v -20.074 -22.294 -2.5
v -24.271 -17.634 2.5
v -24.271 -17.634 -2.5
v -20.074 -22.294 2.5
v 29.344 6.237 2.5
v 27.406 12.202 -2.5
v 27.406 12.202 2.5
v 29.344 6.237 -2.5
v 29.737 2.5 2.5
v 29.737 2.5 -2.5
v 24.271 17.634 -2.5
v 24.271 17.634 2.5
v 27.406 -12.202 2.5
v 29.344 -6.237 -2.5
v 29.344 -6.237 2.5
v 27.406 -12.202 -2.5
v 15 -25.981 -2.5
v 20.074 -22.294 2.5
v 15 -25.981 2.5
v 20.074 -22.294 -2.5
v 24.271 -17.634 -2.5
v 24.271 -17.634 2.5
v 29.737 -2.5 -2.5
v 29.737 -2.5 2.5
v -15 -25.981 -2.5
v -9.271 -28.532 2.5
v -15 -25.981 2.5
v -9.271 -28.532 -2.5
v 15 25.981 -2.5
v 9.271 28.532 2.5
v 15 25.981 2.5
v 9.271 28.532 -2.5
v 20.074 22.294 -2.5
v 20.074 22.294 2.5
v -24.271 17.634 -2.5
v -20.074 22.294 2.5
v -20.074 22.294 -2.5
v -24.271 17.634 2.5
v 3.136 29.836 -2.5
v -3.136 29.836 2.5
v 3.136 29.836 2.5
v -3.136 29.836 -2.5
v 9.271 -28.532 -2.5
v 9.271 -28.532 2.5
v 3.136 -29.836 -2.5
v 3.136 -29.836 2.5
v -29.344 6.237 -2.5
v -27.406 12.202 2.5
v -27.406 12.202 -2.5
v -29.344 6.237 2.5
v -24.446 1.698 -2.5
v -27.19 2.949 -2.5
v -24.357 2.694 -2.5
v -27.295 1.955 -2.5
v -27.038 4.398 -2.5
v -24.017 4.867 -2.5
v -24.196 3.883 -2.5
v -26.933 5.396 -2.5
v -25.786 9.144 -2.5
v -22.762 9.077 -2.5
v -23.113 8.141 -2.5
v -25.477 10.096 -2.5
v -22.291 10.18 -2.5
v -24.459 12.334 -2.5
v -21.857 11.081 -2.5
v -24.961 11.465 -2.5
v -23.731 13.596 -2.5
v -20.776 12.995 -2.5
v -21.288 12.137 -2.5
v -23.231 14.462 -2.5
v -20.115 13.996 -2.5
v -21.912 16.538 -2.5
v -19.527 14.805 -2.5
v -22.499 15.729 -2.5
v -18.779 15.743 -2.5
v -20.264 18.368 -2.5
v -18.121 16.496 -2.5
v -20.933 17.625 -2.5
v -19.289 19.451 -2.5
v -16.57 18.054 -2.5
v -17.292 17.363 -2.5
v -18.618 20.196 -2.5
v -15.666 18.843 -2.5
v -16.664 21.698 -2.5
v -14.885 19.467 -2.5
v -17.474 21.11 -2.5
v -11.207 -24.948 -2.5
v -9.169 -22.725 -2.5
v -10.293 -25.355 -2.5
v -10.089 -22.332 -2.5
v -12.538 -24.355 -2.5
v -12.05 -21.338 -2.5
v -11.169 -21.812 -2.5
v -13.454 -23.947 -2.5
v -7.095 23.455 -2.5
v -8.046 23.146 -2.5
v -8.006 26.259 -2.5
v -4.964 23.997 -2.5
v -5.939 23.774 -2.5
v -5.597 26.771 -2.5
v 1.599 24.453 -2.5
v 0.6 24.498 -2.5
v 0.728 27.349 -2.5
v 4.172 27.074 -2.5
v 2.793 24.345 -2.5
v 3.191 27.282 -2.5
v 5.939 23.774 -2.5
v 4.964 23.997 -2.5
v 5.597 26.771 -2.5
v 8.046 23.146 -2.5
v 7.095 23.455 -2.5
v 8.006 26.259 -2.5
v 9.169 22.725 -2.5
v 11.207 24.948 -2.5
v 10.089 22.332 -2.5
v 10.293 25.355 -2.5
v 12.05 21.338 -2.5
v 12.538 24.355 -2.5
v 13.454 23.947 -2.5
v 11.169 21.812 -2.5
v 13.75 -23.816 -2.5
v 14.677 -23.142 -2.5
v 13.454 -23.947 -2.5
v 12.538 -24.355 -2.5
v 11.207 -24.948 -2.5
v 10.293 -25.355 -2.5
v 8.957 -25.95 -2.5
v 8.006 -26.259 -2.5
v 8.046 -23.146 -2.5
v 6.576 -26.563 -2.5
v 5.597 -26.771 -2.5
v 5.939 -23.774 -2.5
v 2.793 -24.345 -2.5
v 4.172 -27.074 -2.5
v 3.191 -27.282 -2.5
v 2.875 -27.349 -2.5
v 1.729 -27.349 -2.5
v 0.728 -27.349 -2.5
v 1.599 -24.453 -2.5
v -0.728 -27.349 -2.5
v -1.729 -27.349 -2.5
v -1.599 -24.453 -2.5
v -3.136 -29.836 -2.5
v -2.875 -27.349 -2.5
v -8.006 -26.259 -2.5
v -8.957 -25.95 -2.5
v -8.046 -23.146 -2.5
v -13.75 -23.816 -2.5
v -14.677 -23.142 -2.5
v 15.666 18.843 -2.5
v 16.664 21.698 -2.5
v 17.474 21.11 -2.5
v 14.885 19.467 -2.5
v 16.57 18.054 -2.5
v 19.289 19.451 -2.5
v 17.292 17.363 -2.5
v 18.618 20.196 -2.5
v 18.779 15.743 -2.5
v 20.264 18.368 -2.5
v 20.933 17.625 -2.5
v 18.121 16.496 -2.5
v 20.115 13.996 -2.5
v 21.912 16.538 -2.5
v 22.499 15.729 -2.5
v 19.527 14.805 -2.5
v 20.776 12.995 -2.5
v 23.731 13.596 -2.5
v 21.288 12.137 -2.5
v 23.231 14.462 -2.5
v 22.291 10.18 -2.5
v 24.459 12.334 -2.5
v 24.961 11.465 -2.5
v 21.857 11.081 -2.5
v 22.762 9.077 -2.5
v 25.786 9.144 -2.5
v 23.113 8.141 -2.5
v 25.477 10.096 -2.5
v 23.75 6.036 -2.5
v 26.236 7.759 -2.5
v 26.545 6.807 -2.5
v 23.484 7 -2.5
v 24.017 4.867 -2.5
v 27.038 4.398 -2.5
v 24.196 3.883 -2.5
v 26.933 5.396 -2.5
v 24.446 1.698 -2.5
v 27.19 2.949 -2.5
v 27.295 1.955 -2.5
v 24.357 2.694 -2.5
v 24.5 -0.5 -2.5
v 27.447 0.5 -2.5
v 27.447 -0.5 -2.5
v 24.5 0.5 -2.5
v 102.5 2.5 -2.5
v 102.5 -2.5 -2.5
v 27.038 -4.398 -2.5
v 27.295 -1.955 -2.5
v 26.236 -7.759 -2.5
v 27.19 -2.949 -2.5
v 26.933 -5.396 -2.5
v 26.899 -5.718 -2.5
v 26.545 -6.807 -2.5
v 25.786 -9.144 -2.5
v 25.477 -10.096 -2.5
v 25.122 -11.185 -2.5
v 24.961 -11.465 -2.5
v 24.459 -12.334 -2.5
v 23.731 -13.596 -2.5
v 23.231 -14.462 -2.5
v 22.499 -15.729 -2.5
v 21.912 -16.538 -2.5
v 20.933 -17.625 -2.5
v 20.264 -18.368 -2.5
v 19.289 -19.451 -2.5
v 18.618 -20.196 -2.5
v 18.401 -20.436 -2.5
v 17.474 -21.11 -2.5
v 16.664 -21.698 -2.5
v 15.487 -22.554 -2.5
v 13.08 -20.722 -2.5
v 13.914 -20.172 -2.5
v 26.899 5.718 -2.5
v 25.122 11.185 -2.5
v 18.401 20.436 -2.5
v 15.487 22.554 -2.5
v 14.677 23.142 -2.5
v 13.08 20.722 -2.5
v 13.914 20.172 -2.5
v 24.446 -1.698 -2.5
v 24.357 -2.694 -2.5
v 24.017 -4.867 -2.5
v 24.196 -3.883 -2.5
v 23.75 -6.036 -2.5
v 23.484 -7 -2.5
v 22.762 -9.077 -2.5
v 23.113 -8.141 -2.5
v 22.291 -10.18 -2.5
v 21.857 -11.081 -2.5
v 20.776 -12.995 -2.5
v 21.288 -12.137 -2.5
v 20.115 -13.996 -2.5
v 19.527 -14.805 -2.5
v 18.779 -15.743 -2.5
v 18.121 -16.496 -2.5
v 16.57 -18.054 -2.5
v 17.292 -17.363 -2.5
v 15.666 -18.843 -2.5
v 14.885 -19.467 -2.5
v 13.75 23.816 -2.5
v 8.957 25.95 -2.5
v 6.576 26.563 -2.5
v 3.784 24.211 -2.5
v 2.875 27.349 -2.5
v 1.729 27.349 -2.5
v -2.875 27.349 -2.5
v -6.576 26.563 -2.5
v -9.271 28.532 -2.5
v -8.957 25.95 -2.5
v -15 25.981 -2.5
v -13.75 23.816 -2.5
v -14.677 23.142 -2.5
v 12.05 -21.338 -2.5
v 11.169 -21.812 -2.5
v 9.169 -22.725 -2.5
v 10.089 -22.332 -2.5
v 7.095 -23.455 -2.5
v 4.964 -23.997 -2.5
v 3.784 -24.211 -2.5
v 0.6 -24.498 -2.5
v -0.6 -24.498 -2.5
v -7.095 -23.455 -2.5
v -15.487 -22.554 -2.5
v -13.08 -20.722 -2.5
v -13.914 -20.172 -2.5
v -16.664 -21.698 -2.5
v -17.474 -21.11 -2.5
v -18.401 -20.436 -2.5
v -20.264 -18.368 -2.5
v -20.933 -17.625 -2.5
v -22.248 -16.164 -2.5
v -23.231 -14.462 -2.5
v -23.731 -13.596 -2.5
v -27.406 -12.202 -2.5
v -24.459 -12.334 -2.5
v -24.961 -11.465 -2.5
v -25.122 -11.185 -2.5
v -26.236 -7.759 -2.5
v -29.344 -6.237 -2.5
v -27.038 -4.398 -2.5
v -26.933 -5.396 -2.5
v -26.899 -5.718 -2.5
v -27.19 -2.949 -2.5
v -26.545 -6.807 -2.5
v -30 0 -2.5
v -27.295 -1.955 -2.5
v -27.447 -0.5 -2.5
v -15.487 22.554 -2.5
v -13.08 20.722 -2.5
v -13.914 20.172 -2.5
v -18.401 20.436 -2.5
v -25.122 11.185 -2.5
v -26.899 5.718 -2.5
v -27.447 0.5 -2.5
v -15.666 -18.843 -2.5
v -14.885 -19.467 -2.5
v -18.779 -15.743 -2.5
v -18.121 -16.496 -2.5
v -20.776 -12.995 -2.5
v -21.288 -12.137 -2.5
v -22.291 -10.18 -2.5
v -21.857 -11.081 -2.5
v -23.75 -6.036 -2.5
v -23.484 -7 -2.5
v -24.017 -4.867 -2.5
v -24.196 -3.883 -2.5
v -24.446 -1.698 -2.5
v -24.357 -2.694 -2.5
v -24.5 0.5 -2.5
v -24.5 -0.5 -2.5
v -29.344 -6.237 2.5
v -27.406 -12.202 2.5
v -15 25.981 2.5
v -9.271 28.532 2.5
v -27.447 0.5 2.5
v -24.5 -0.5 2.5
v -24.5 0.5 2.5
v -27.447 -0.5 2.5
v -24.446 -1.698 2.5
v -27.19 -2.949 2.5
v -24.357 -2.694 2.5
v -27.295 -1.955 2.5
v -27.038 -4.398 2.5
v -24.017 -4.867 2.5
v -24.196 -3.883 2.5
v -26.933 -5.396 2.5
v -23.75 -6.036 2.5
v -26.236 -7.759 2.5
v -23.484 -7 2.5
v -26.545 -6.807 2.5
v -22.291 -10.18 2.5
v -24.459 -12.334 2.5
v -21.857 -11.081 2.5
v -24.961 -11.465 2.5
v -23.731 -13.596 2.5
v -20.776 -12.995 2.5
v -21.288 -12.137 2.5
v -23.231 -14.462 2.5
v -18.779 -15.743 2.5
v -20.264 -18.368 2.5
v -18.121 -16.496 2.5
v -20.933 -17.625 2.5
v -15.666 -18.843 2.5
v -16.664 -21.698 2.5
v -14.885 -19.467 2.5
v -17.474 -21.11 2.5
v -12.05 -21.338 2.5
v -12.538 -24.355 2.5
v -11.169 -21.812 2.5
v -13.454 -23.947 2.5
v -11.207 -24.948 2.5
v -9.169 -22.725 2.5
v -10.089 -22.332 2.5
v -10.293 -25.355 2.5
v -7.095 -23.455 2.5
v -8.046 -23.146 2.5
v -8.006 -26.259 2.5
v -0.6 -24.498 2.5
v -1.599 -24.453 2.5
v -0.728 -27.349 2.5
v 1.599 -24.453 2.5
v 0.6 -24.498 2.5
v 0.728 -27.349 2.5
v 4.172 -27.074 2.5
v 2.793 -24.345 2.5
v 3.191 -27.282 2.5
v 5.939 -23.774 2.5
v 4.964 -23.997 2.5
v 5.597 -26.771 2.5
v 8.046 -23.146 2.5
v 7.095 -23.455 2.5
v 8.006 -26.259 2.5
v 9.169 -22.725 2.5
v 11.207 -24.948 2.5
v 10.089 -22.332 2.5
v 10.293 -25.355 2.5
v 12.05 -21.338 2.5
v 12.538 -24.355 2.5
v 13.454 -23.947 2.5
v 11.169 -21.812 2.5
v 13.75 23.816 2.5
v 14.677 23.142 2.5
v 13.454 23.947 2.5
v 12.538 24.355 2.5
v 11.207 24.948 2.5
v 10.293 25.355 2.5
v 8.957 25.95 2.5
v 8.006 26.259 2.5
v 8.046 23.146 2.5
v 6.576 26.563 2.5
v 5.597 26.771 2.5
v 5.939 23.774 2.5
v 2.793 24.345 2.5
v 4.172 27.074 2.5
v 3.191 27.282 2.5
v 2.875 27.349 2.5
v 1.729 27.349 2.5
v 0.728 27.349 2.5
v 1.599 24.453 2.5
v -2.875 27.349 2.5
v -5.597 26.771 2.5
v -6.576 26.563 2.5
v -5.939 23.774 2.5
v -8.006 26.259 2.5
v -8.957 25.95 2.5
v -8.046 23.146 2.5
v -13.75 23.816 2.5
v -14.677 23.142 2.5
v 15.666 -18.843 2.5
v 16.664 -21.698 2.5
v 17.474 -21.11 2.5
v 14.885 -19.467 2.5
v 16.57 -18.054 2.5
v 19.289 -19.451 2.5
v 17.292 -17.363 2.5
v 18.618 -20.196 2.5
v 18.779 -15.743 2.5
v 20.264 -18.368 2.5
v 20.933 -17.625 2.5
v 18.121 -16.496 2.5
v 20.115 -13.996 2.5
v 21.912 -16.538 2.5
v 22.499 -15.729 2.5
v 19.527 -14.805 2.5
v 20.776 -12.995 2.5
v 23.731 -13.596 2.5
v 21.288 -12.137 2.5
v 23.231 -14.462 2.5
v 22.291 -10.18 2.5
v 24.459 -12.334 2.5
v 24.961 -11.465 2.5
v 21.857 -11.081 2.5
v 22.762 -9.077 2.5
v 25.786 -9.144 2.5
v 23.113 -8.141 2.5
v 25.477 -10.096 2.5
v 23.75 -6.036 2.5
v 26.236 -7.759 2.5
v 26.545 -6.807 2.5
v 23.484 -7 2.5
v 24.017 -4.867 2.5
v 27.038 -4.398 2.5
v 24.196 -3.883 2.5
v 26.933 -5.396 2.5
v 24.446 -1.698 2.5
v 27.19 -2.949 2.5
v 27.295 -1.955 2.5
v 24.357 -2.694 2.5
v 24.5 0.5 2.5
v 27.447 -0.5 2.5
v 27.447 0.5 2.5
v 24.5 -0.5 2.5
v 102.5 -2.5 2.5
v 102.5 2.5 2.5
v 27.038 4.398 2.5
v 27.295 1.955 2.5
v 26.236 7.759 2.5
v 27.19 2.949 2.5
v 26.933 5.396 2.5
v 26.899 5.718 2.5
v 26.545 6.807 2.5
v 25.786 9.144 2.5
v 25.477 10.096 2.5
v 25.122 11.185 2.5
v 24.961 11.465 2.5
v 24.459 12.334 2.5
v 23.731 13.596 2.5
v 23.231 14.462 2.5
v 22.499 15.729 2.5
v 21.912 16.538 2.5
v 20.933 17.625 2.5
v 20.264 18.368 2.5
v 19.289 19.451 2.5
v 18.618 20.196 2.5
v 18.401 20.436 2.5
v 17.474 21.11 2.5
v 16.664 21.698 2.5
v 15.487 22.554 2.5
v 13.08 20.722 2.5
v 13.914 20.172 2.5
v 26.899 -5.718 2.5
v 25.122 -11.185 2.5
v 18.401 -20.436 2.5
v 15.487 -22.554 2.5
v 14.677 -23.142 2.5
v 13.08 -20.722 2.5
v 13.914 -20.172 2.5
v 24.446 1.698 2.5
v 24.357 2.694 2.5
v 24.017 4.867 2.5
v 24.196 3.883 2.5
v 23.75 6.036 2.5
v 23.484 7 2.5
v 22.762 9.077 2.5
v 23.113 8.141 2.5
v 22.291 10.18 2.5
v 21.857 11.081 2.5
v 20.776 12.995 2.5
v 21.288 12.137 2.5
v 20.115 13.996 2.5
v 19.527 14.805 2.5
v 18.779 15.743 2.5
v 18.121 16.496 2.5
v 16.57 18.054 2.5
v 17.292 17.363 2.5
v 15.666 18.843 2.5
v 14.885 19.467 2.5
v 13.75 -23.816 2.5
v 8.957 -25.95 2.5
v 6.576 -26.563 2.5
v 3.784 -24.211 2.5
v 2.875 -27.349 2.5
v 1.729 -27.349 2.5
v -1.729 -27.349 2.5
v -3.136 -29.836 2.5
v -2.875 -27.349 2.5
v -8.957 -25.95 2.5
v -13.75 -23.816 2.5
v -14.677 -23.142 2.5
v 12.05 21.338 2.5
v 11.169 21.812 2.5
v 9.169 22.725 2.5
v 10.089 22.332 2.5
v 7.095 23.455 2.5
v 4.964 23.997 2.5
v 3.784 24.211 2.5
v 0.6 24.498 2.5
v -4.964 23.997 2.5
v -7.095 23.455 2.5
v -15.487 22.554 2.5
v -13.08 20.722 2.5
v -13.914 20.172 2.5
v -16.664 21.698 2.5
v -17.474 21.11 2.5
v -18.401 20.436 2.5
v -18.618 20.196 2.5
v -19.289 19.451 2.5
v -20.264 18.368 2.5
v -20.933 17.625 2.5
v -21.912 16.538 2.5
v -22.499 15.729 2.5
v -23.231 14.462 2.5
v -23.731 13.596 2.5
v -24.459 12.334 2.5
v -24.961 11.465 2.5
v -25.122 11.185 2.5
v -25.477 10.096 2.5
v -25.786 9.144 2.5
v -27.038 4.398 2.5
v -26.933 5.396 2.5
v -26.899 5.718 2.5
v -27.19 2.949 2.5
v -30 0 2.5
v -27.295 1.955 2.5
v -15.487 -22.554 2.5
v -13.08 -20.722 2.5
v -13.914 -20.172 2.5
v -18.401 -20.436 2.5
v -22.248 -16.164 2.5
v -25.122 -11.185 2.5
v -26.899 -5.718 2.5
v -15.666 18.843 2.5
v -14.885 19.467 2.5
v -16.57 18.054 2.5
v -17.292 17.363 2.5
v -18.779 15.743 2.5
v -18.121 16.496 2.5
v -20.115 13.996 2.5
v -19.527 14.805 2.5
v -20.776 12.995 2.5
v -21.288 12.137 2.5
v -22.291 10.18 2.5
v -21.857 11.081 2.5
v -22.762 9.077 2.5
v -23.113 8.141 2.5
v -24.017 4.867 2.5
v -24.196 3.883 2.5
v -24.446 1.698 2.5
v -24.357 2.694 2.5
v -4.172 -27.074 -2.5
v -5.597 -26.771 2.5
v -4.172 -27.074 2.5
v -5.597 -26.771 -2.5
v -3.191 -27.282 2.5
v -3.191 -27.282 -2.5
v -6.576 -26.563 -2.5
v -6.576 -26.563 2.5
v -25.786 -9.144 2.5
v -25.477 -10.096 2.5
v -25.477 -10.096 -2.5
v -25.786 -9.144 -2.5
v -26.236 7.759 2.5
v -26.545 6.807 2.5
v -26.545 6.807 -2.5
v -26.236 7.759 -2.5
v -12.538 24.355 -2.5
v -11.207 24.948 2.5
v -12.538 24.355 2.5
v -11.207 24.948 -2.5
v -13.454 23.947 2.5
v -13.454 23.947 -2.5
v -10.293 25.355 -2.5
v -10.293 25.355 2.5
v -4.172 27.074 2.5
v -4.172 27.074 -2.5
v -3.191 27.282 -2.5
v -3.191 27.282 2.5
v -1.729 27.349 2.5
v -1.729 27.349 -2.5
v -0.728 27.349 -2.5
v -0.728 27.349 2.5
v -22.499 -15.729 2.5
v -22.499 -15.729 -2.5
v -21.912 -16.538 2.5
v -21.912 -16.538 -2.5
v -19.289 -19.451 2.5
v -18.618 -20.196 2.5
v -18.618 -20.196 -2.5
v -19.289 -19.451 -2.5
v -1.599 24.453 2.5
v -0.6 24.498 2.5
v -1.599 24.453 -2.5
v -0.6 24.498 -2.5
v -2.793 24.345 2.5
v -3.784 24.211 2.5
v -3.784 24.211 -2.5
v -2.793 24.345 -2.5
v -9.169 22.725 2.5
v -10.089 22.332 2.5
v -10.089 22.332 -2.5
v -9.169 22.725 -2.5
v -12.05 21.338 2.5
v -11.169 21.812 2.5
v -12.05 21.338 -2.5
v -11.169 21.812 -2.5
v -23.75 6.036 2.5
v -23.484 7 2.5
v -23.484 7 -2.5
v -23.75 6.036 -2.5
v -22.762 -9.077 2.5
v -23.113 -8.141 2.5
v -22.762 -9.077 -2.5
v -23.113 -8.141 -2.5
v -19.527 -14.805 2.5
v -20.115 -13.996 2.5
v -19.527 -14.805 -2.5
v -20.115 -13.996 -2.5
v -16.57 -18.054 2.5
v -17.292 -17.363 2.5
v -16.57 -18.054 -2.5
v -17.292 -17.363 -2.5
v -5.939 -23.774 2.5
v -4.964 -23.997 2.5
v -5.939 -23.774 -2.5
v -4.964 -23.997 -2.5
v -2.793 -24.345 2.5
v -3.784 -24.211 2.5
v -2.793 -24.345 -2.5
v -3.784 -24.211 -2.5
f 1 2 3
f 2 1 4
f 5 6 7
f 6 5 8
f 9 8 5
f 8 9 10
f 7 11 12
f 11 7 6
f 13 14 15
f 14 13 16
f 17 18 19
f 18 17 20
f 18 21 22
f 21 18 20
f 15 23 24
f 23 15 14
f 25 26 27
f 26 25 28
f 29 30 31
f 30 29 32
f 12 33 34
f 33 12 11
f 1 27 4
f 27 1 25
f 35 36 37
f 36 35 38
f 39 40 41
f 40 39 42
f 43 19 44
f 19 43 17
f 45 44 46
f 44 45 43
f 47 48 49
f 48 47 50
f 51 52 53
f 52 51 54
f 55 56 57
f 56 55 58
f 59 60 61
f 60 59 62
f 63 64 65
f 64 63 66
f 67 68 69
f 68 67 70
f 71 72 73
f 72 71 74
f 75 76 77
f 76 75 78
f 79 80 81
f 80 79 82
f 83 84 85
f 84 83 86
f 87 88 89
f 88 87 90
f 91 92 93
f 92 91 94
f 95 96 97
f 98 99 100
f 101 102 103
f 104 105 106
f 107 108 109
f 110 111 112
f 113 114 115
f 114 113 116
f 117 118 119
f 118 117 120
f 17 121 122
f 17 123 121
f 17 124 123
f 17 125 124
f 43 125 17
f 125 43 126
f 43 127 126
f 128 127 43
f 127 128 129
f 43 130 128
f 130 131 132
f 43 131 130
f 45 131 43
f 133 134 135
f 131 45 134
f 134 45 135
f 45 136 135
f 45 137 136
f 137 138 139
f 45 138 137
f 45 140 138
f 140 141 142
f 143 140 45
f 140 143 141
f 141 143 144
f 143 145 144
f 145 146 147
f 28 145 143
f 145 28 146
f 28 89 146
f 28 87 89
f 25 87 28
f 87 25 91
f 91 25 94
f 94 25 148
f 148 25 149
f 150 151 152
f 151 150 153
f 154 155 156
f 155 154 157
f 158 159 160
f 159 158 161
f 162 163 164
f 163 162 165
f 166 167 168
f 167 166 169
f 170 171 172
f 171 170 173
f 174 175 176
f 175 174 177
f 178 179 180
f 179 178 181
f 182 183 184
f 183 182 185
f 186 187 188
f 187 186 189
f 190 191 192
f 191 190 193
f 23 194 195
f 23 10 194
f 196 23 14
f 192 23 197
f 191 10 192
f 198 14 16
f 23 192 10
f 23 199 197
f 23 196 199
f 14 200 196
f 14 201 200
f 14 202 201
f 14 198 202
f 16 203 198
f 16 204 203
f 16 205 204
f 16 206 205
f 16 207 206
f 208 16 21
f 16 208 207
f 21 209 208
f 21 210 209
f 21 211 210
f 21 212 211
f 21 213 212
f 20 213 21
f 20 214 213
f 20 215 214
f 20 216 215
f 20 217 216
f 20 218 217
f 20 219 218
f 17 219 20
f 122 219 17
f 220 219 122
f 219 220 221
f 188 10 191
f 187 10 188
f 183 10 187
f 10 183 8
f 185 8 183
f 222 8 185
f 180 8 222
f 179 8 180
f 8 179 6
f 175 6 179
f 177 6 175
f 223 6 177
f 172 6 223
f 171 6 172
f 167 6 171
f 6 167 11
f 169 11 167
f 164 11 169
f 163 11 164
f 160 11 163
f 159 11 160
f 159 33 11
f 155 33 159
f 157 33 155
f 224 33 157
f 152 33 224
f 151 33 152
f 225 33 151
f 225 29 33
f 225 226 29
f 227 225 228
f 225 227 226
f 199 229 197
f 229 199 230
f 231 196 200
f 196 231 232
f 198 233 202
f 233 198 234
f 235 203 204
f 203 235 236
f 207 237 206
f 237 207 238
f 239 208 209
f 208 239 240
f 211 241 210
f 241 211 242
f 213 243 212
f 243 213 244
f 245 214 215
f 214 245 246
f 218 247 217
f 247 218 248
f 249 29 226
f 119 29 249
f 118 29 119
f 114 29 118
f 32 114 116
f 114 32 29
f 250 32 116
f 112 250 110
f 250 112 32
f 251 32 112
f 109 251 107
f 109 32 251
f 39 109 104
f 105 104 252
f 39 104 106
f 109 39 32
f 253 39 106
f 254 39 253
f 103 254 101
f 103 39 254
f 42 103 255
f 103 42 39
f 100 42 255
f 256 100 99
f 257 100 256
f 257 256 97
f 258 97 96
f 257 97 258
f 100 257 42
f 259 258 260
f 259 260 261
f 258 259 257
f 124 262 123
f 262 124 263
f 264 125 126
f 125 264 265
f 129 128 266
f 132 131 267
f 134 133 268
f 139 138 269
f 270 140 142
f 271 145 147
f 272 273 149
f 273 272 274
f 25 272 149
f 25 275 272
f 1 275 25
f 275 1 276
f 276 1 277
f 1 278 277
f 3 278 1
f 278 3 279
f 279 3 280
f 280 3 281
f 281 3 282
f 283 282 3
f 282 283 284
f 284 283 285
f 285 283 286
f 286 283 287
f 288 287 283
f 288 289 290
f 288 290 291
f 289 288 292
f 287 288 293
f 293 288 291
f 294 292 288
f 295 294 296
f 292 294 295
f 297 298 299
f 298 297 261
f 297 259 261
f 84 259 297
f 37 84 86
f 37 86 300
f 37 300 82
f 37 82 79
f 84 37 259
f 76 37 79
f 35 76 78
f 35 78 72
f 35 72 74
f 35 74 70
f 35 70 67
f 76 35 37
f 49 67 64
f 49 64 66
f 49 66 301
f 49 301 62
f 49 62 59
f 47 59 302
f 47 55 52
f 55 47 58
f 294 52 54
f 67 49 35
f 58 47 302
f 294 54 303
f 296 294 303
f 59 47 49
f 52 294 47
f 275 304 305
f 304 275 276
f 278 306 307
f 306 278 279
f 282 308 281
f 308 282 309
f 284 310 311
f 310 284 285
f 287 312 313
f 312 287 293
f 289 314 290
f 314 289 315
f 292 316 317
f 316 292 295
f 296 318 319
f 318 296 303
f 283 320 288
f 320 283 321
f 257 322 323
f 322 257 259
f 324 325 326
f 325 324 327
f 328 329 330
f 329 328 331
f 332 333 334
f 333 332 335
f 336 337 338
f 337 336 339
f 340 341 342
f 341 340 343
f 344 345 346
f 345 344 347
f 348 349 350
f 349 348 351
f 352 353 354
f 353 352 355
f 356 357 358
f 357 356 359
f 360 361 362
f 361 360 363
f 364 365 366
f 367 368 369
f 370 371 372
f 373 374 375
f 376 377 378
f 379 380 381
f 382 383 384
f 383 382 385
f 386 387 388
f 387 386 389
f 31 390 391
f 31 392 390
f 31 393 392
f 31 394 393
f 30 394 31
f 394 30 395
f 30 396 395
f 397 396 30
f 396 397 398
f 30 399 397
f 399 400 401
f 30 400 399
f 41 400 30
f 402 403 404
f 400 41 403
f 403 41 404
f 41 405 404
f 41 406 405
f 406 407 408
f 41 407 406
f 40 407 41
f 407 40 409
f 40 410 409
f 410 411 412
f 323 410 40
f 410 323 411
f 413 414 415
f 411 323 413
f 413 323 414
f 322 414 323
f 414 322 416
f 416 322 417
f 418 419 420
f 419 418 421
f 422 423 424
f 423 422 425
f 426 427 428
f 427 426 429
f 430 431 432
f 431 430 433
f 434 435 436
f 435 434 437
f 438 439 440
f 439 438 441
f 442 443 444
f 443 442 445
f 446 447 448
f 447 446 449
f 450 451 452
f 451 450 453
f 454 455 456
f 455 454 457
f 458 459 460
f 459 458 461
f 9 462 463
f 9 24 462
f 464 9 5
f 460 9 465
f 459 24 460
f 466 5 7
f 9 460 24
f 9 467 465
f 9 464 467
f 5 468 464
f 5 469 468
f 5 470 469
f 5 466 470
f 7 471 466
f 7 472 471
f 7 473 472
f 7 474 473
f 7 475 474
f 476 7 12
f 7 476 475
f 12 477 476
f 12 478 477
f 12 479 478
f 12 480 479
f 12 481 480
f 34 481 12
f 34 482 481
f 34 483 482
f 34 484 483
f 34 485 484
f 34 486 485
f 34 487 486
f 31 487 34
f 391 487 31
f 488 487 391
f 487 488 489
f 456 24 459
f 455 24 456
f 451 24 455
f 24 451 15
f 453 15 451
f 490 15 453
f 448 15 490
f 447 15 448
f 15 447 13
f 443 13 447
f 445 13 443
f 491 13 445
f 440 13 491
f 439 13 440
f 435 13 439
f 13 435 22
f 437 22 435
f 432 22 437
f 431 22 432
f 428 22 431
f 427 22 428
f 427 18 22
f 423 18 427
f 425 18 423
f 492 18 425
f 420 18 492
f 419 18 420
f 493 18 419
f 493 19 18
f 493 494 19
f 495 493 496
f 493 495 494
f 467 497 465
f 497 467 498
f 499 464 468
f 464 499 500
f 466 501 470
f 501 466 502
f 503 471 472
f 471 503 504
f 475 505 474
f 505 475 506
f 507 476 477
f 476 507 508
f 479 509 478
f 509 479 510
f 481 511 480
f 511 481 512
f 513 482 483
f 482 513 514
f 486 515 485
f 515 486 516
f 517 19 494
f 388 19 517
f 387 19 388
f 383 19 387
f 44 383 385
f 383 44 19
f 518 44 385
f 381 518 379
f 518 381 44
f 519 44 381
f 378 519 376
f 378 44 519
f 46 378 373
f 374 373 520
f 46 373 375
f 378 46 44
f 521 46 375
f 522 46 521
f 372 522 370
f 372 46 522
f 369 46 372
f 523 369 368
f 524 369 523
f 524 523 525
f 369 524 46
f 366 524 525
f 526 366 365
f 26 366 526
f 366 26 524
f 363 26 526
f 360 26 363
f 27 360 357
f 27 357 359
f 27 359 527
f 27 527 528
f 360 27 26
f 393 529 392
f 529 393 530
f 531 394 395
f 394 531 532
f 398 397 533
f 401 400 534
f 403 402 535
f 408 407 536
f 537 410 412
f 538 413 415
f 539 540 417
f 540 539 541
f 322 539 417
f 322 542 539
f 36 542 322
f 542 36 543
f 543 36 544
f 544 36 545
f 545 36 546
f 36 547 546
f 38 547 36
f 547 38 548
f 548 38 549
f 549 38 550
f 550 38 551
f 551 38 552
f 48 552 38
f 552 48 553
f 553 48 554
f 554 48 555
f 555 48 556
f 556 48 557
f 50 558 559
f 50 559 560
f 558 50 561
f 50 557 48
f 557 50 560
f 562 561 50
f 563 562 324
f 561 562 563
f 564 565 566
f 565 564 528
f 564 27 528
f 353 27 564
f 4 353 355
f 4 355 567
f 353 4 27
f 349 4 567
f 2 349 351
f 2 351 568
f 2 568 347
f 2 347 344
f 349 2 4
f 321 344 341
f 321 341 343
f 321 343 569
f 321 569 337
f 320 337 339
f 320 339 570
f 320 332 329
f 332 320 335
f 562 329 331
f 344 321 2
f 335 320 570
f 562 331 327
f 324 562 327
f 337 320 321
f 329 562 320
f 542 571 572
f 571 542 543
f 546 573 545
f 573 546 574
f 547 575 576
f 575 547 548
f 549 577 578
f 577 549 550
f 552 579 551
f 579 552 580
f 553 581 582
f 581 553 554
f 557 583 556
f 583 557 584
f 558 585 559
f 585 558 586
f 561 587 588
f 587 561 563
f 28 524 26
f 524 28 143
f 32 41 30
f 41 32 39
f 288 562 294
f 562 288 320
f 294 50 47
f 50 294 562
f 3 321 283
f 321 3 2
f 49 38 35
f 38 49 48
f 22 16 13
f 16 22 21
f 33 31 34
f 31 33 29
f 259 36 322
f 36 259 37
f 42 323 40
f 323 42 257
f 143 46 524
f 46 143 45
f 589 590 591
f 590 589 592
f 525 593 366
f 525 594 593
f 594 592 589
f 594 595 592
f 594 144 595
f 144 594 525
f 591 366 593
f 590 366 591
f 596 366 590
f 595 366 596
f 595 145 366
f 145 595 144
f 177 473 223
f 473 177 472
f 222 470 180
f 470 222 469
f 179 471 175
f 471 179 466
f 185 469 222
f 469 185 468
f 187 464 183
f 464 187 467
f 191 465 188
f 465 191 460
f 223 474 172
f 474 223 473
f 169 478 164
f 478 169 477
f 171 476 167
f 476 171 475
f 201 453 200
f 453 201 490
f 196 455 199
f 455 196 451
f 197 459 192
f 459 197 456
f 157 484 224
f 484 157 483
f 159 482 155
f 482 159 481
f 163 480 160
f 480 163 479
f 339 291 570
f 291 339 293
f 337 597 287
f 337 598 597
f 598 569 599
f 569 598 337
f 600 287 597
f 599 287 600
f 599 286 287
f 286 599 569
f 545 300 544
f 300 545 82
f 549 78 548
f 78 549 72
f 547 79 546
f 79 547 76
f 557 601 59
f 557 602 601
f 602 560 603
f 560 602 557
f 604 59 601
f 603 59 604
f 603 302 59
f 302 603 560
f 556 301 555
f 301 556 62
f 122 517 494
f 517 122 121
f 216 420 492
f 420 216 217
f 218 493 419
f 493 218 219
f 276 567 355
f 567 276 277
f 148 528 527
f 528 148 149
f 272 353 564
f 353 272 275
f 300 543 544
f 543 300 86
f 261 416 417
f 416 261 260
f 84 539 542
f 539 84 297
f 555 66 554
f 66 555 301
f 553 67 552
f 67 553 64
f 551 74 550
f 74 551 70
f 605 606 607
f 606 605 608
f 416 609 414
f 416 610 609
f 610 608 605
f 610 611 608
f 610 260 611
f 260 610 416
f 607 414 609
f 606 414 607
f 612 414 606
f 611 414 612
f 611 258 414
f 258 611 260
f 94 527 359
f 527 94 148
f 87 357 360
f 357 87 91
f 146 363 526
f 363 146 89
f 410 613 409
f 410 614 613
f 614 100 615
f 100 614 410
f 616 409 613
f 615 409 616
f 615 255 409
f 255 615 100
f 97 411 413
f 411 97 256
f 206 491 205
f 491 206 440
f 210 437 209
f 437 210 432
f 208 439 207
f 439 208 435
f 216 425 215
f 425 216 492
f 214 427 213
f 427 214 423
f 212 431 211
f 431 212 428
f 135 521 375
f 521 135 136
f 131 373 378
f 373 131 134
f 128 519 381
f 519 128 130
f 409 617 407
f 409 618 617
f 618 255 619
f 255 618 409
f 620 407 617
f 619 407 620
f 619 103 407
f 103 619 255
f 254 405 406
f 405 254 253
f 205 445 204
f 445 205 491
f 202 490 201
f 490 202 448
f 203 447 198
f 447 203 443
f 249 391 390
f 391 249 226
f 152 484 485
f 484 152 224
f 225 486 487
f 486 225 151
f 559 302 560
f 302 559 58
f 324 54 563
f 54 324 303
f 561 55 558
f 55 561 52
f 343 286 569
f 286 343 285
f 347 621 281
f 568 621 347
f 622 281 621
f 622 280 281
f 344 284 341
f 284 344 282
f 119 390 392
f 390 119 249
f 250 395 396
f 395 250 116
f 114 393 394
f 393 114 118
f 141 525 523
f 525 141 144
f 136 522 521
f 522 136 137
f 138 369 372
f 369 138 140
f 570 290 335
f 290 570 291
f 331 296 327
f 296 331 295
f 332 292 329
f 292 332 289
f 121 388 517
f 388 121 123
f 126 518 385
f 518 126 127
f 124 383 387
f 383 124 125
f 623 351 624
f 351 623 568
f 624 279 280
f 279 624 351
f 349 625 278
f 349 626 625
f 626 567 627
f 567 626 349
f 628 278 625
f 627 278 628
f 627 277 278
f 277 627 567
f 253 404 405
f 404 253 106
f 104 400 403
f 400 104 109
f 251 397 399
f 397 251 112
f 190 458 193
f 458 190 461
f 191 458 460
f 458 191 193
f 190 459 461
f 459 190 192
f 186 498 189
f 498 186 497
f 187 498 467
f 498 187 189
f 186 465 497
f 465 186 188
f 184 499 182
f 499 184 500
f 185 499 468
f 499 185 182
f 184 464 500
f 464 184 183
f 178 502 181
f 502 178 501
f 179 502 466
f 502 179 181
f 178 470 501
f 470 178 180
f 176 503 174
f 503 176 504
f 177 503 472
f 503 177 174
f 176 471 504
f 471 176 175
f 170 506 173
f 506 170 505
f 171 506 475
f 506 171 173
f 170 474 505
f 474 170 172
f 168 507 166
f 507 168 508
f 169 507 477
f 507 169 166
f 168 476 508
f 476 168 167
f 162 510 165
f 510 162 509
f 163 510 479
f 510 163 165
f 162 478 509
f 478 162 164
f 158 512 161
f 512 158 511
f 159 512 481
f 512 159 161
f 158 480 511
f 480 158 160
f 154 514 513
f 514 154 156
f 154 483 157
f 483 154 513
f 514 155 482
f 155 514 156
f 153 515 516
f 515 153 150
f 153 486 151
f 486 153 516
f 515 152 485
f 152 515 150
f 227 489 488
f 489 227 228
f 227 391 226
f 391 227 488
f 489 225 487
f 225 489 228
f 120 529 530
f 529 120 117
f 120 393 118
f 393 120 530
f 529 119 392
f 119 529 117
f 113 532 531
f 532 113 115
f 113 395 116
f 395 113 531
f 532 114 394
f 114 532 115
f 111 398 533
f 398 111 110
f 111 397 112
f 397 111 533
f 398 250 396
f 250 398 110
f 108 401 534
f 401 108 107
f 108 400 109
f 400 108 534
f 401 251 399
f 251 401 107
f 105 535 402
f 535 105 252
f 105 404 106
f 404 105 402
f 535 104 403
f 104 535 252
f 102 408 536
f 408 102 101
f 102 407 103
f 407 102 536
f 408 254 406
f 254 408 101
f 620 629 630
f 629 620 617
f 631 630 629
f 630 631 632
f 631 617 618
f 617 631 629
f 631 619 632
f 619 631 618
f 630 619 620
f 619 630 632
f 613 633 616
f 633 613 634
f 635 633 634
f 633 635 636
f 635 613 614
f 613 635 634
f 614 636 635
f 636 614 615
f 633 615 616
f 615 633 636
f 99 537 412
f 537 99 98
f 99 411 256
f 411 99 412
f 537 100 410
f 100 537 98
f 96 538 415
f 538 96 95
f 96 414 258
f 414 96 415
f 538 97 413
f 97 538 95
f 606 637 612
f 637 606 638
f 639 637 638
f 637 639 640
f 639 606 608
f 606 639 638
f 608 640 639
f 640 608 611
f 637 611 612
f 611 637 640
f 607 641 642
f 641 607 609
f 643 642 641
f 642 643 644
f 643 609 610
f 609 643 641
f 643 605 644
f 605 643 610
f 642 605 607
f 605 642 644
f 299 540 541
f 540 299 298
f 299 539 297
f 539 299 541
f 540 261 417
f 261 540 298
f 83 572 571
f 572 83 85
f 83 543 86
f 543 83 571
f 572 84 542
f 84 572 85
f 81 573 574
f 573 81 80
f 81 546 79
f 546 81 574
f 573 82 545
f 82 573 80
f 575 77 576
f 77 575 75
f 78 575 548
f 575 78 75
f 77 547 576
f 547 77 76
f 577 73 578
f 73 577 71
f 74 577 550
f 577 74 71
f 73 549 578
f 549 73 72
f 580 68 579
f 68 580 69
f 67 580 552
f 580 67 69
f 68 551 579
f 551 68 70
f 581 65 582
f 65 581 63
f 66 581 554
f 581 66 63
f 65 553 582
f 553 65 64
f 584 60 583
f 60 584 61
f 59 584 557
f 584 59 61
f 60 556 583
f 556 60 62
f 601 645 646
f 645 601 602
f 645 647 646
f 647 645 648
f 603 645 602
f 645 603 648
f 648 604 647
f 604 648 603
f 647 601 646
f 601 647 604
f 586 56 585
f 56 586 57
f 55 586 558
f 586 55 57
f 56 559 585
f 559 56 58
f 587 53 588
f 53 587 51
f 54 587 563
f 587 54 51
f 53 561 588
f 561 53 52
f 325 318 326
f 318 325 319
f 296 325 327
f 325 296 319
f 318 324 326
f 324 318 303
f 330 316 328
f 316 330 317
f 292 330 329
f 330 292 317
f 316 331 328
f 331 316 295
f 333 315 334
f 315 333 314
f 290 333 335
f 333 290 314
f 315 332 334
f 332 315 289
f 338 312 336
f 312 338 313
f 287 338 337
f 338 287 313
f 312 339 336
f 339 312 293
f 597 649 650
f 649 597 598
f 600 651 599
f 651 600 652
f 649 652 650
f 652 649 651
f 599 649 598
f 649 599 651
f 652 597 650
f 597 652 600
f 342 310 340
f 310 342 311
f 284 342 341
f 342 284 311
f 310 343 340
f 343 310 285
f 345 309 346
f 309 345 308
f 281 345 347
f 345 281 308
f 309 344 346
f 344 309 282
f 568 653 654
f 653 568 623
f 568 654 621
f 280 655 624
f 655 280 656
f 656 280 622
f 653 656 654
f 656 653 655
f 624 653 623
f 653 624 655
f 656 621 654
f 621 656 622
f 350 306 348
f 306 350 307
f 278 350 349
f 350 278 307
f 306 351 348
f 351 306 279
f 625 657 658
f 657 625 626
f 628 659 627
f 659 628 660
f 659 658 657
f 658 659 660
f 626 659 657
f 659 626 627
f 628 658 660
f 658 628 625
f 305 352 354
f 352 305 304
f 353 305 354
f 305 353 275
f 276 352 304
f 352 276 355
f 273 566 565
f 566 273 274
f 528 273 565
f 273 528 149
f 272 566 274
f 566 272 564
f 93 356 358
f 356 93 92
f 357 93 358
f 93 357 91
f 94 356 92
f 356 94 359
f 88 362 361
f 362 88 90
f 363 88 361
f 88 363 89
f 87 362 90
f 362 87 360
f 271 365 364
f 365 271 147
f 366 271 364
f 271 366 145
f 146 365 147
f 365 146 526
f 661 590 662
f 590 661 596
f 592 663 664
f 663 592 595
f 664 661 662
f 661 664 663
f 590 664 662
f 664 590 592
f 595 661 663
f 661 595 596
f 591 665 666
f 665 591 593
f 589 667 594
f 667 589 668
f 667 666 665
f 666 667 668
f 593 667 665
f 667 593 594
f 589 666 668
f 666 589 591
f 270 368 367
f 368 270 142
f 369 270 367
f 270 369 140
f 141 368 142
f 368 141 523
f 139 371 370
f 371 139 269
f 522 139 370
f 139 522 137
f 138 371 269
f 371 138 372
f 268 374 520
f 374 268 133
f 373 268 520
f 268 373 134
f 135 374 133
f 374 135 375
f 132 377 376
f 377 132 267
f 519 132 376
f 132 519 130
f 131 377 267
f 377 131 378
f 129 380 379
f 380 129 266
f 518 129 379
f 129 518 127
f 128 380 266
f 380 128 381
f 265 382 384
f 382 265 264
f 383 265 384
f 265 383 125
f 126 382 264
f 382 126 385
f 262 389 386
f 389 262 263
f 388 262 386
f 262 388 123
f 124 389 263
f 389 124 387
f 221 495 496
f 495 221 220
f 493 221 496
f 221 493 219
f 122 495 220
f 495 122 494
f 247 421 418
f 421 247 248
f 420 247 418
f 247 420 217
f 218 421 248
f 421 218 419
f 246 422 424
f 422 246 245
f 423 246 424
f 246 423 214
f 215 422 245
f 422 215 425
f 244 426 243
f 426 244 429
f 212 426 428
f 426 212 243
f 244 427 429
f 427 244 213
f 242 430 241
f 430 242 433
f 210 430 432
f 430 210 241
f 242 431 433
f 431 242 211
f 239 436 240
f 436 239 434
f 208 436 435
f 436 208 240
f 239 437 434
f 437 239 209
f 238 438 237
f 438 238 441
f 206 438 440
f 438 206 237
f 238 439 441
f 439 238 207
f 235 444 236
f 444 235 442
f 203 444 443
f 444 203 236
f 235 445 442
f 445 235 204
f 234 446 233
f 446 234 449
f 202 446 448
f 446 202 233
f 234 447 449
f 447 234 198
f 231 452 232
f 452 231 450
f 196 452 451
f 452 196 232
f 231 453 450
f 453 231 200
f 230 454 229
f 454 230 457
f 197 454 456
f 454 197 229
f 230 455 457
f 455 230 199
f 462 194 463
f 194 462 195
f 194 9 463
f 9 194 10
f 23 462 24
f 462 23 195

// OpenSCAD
  //Ring Diameter
  diameter=60;
  //Ring Height
  height=5;
  //Ring Thickness
  ring_thickness=5;
  
  //Notch Length
  notch_length=3;
  //Notch Thickness
  notch_thickness=1;
  //Notch Placement
  notch_placement=4;
  //Notch Height
  notch_height=0;
  //Notch Count
  notch_count=70;

  //Handle Length
  length=75;
  //Handle Thickness
  thickness=5;

union(){
  difference(){
    cylinder(d=diameter,h=height, center=true); 
    cylinder(d=diameter-ring_thickness,h=height*5, center=true);    
  }
  for(i = [0:notch_count]){
    rotate(360/notch_count*i){  
      translate([diameter/2-notch_placement,0,0]){
        cube([notch_length,notch_thickness,height+notch_height], center=true);
      }
    }
  }
  translate([(diameter/2)+(length/2)-(ring_thickness/2),0,0]){
    cube([length,thickness,thickness],center=true);
  }    
}
